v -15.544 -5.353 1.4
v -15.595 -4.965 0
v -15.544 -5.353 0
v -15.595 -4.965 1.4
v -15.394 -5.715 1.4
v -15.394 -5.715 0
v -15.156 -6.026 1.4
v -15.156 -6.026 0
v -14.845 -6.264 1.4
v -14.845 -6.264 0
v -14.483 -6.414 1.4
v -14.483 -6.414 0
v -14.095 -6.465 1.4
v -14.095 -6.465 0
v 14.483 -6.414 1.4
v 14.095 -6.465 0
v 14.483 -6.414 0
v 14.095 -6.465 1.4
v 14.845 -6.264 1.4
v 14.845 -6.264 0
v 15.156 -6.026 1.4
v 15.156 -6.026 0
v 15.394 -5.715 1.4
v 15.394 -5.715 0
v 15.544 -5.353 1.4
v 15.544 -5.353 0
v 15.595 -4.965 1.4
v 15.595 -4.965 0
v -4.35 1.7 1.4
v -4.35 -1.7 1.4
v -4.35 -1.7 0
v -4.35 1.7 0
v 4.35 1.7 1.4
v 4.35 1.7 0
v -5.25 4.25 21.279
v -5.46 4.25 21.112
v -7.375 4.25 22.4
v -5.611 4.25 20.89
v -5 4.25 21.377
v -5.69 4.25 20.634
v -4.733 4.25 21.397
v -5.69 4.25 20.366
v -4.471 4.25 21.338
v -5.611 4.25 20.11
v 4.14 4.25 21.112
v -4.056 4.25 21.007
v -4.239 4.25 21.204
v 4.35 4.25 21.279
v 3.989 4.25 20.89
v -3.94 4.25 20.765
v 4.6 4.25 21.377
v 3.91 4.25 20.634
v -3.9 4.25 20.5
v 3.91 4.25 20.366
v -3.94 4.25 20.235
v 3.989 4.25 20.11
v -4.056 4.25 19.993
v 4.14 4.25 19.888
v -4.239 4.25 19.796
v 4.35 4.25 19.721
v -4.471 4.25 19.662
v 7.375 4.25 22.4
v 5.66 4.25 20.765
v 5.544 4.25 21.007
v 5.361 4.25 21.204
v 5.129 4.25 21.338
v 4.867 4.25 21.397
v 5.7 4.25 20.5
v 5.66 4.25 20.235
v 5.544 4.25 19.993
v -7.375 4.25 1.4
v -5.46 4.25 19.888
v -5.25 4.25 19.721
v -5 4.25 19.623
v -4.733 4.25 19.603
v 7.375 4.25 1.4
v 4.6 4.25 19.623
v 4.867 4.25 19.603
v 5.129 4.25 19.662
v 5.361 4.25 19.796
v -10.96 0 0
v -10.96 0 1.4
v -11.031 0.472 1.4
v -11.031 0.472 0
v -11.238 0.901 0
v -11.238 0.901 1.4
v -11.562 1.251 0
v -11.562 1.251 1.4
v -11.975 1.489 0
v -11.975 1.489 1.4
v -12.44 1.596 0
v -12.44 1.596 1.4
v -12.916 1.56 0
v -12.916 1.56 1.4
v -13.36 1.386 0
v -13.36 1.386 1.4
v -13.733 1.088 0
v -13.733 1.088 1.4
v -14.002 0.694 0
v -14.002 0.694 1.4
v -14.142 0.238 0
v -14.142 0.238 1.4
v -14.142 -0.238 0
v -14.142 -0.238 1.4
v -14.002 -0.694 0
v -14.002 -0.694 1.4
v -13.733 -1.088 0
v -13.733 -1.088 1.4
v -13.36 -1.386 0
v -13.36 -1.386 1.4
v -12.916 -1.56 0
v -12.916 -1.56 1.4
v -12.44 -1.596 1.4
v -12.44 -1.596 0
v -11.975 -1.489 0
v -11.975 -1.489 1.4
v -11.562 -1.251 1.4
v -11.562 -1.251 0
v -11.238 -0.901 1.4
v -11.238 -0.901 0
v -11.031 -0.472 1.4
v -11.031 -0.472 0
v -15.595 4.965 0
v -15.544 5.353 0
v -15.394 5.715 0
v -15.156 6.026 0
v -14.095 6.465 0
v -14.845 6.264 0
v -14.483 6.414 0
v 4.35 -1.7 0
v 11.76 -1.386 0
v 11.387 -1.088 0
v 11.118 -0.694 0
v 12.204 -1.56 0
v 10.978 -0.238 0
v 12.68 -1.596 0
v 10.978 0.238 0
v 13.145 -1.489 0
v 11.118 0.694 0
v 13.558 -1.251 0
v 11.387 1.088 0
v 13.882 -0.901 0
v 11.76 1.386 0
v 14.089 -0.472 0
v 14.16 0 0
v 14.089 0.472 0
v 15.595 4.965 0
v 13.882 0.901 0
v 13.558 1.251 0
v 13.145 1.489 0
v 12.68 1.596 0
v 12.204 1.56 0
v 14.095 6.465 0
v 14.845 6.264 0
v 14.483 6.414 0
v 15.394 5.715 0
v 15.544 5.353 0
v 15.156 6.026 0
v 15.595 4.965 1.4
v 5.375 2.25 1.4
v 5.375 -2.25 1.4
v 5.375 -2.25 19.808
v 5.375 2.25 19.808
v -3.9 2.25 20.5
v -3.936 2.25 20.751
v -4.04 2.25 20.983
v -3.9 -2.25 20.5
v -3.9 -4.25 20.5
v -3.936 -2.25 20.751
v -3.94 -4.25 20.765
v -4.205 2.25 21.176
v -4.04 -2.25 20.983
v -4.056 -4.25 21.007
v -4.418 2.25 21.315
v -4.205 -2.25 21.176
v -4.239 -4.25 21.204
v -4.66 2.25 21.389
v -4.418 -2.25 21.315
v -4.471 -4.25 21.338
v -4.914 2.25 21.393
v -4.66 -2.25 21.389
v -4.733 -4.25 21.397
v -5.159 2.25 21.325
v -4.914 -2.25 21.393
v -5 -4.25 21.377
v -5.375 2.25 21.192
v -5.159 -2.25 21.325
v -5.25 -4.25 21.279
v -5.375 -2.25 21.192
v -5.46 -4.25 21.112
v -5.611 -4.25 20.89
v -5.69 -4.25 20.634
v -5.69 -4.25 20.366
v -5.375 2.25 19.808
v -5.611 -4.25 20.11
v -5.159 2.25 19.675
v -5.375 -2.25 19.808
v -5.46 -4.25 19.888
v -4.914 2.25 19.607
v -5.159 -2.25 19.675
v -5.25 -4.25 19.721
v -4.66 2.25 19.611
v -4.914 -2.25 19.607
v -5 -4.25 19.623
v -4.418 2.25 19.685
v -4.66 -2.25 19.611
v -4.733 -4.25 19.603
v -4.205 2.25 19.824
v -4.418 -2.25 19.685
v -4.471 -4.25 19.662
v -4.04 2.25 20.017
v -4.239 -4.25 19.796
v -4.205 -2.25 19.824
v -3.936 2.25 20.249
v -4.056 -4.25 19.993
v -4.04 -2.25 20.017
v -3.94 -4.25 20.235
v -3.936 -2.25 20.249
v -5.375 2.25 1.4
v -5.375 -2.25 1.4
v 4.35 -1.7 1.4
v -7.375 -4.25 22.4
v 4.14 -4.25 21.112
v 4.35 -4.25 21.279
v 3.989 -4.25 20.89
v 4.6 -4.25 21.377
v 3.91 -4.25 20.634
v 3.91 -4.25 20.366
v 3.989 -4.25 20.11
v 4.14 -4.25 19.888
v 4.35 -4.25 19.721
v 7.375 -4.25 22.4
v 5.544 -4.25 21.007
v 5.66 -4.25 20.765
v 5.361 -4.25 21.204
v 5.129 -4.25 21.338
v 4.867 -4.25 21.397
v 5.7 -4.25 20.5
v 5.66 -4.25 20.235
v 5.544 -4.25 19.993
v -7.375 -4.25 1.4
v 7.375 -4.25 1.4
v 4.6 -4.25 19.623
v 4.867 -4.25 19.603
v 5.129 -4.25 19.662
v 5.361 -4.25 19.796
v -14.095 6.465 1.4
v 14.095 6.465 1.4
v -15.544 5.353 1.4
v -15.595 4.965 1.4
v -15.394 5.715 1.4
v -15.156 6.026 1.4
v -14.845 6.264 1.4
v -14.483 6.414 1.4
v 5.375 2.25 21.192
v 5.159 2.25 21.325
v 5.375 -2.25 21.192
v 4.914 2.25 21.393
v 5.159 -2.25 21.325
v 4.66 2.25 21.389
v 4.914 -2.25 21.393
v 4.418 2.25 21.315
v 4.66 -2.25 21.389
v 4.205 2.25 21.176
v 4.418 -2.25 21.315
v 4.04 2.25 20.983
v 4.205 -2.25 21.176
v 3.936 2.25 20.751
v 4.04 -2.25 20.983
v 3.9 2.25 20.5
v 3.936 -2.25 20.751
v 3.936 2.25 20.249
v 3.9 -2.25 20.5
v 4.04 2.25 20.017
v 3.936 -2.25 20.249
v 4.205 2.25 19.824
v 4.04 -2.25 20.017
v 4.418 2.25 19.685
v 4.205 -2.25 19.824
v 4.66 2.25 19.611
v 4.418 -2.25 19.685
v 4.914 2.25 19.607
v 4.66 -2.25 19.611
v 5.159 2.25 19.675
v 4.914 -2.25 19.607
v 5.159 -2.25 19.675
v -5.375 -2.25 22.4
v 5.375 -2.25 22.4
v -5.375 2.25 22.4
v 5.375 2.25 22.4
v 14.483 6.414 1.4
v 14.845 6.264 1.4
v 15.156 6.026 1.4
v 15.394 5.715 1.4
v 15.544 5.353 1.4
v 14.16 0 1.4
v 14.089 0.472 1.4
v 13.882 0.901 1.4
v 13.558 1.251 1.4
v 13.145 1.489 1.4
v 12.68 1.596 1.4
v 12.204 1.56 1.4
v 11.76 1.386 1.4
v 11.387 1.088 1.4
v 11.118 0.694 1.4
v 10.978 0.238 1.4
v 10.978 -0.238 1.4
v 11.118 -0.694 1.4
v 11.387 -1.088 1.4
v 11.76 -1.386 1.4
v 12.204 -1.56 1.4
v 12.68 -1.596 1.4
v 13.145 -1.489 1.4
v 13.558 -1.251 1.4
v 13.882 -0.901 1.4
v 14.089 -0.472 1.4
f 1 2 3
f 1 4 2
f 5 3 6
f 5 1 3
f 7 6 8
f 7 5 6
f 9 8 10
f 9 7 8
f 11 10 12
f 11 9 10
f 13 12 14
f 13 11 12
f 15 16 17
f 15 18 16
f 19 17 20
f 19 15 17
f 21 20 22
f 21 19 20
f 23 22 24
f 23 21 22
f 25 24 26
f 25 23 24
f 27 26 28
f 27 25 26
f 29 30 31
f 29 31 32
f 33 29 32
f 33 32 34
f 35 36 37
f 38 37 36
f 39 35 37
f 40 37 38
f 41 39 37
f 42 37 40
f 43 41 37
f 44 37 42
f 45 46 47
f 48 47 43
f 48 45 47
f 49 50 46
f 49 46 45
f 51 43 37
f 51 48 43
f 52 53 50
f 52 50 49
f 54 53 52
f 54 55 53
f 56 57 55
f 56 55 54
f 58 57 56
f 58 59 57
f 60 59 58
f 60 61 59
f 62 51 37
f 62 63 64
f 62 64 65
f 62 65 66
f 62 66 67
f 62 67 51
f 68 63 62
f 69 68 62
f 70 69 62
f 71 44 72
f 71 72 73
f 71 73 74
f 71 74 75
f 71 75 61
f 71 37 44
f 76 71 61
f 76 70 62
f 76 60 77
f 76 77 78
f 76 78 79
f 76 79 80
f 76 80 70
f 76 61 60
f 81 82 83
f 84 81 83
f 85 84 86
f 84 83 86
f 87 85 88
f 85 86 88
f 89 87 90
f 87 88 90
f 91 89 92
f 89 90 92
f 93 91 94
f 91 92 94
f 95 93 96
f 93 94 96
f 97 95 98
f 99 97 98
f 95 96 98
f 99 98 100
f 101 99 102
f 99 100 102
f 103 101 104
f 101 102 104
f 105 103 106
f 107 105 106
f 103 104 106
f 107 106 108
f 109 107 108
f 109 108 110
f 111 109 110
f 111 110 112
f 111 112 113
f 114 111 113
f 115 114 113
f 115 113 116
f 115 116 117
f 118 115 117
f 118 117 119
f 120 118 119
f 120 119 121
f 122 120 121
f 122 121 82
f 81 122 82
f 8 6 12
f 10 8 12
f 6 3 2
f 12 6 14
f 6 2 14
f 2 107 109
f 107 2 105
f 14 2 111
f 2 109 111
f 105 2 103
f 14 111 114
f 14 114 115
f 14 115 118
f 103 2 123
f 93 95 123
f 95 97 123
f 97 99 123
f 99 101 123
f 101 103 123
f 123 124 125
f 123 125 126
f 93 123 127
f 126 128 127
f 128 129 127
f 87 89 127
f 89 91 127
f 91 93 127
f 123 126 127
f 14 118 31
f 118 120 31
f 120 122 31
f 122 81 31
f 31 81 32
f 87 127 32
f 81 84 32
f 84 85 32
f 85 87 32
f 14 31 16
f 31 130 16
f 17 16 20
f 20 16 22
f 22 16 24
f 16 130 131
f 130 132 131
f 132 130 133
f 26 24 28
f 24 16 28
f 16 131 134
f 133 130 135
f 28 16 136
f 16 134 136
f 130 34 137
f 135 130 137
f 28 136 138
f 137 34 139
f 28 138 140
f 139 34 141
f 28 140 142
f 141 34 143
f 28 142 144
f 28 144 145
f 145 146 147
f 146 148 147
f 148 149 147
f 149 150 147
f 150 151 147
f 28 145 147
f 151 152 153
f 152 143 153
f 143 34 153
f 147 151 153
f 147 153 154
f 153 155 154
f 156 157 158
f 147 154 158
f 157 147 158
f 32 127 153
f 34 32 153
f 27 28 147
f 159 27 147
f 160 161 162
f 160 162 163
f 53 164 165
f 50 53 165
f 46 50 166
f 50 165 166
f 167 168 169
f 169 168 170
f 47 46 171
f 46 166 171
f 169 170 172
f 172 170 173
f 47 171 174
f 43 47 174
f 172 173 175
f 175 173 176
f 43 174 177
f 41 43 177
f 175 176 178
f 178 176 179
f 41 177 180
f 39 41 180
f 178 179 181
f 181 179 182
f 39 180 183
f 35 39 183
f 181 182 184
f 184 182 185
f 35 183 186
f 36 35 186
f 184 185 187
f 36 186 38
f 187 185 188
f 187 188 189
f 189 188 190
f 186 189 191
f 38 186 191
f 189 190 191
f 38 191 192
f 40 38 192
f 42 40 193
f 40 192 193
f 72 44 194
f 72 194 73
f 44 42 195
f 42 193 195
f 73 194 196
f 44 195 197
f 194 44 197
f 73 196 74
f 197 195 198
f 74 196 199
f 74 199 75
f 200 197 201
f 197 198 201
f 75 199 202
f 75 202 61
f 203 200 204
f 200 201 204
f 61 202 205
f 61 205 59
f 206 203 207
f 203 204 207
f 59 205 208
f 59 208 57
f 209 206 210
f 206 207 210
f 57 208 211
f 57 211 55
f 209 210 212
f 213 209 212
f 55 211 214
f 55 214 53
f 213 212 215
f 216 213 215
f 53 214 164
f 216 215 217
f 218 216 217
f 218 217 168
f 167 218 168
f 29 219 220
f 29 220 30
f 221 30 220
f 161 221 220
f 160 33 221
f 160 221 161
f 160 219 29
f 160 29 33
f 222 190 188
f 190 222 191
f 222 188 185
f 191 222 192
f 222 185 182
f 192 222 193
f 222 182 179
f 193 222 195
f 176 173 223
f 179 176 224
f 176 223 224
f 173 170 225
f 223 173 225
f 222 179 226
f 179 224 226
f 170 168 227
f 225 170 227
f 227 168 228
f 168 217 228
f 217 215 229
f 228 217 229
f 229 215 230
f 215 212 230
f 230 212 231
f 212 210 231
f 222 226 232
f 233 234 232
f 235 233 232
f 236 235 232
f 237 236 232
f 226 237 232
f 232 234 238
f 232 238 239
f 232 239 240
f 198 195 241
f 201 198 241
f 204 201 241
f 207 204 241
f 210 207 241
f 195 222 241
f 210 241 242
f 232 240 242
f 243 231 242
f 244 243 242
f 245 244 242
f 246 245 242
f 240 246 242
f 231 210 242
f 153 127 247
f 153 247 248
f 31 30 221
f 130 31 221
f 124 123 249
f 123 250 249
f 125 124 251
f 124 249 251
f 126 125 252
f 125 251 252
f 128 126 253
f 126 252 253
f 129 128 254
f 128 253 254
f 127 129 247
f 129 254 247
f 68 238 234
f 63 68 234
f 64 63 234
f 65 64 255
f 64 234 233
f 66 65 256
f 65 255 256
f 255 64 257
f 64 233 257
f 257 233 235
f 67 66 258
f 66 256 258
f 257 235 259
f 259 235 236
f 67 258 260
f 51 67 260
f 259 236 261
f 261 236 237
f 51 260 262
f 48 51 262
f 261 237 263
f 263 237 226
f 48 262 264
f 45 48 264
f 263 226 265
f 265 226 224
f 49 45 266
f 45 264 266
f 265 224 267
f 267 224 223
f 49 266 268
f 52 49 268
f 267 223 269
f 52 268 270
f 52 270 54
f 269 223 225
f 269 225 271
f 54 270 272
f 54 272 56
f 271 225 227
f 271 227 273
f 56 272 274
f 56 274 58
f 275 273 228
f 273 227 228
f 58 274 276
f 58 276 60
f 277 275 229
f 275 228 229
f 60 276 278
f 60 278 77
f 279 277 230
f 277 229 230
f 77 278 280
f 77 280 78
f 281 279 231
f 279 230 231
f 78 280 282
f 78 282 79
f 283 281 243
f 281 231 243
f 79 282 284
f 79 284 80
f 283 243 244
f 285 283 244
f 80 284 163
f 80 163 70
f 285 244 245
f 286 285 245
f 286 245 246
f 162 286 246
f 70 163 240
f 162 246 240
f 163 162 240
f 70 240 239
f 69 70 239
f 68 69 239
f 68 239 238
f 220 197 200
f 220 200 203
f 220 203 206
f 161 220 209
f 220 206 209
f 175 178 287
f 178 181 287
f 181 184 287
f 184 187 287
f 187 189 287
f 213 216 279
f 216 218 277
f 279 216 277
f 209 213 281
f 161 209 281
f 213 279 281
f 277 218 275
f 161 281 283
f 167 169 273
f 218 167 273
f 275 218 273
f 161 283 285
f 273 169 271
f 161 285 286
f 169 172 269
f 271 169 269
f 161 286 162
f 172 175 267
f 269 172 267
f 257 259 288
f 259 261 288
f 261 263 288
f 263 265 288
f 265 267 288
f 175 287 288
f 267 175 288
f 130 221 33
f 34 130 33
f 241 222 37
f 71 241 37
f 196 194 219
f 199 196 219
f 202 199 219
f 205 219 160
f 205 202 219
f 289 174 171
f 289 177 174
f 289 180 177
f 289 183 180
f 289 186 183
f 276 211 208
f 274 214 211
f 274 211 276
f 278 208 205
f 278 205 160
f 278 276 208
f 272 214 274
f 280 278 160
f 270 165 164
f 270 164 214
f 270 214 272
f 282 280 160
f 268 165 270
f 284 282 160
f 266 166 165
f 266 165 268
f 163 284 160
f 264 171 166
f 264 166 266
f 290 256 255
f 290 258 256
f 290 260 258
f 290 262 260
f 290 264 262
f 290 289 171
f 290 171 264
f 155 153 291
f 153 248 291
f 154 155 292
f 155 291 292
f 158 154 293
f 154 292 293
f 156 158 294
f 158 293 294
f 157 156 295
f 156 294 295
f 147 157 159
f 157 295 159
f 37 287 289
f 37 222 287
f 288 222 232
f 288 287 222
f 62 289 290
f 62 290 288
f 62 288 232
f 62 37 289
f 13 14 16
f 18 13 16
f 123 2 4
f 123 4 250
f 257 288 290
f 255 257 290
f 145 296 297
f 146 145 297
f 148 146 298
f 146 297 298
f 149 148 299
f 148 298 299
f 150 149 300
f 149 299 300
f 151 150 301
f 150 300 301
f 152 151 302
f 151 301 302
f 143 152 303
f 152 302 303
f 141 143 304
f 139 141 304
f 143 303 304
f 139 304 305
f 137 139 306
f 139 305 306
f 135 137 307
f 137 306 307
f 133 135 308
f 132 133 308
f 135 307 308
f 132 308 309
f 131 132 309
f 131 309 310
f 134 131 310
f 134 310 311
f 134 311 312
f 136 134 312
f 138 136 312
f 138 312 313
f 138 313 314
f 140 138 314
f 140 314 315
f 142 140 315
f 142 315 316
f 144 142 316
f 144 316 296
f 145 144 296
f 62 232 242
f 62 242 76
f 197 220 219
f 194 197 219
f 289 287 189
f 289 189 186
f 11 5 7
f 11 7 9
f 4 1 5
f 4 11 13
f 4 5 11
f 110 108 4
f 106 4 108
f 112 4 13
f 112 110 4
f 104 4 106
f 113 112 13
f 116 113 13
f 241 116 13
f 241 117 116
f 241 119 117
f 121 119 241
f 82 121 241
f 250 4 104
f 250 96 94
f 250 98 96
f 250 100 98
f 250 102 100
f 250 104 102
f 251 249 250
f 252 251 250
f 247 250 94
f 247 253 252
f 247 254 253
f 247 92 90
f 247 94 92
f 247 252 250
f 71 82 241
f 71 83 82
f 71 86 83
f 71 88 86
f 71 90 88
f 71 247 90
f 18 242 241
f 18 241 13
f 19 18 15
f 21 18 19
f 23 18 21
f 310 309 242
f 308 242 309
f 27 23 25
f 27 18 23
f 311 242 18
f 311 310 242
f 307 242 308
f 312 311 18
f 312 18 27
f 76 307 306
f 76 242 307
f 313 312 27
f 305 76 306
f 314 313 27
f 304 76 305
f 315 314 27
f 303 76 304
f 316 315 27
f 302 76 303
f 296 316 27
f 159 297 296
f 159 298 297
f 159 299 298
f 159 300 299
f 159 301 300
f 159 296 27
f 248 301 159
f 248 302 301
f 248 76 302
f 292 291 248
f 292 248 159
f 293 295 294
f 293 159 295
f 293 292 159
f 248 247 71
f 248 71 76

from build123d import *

# Parameters (mm, degrees)
F0_W      = 31.19
F0_H      = 12.93
F1_DEPTH  = 1.4
F2_R      = 1.6
F3_DEPTH  = 1.401
F4_R      = 1.5
F5_W      = 8.7
F5_H      = 3.4
F6_DEPTH  = 1.401
F7_W      = 14.75
F7_H      = 8.5
F8_DEPTH  = 21
F9_W      = 10.75
F9_H      = 4.5
F10_DEPTH = 21
F11_R     = 0.9
F12_DEPTH = 10.716


with BuildPart() as f1:
    # F0 (on Top) → F1 (new body)
    with BuildSketch(Plane.XY):
        Rectangle(F0_W, F0_H)
    extrude(amount=F1_DEPTH)

    # F2 (on face) → F3 (cut, through all)
    with BuildSketch(Plane.XY.offset(1.4)):
        with Locations((-12.56, 0)):
            Circle(F2_R)
        with Locations((12.56, 0)):
            Circle(F2_R)
    extrude(amount=-F3_DEPTH, mode=Mode.SUBTRACT)

    # F4
    f4_edges = [f1.edges().sort_by_distance(p)[0] for p in [
        (15.595, -6.465, 0.7),
        (15.595, 6.465, 0.7),
        (-15.595, -6.465, 0.7),
        (-15.595, 6.465, 0.7),
    ]]
    fillet(f4_edges, radius=F4_R)

    # F5 (on face) → F6 (cut, through all)
    with BuildSketch(Plane.XY.offset(1.4)):
        Rectangle(F5_W, F5_H)
    extrude(amount=-F6_DEPTH, mode=Mode.SUBTRACT)

    # F7 (on face) → F8 (join)
    with BuildSketch(Plane.XY.offset(1.4)):
        Rectangle(F7_W, F7_H)
    extrude(amount=F8_DEPTH)

    # F9 (on face) → F10 (cut, through all)
    with BuildSketch(Plane.XY.offset(22.4)):
        Rectangle(F9_W, F9_H)
    extrude(amount=-F10_DEPTH, mode=Mode.SUBTRACT)

    # F11 (on face) → F12 (cut, through all)
    with BuildSketch(Plane.XZ.offset(4.25)):
        with Locations((-4.8, 20.5)):
            Circle(F11_R)
        with Locations((4.8, 20.5)):
            Circle(F11_R)
    extrude(amount=-F12_DEPTH, mode=Mode.SUBTRACT)


solid = f1.part
